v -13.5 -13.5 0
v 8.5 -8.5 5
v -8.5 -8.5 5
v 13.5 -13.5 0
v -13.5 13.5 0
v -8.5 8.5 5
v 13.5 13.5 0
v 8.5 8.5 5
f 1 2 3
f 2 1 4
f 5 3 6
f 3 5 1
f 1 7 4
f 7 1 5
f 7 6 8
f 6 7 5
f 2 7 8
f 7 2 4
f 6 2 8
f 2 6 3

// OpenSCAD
side_width=30;
margin=3;
depth=5;

slack=0.2;
e=0.001;
$fn=50;

magnet_h=1.7+2*slack;
magnet_d=3+slack;
magnet_cover=0.2;

//rot5()
//one_block();

one_side_with_magnet();

module one_block() {
    translate([0, 0, -side_width/2])
    difference() {
        linear_extrude(height=side_width/2, scale=0)
        square(side_width, center=true);

        
        translate([0, 0, -e])
        one_side();
        
        translate([0, 0, depth + magnet_cover])
        cylinder(d=magnet_d, h=magnet_h);
    }
}

module one_side() {
    w = side_width - margin;
    difference() {
        linear_extrude(height=w/2, scale=0)
        square(w, center=true);
        
        translate([0, 0, w + depth])
        cube(2*w, center=true);
    }
}

module one_side_with_magnet() {
    union() {
        one_side();
        
        translate([0, 0, depth - magnet_h - magnet_cover])
        cylinder(d=magnet_d, h=magnet_h);
    }
}

module rot5() {
    translate([e, 0, 0])
    rotate([0, 90, 0])
    children();
    translate([-e, 0, 0])
    rotate([0, -90, 0])
    children();
    translate([0, -e, 0])
    rotate([90, 0, 0])
    children();
    translate([0, e, 0])
    rotate([-90, 0, 0])
    children();
    translate([0, 0, -e])
    rotate([180, 0, 0])
    children();
    
    children();
}
